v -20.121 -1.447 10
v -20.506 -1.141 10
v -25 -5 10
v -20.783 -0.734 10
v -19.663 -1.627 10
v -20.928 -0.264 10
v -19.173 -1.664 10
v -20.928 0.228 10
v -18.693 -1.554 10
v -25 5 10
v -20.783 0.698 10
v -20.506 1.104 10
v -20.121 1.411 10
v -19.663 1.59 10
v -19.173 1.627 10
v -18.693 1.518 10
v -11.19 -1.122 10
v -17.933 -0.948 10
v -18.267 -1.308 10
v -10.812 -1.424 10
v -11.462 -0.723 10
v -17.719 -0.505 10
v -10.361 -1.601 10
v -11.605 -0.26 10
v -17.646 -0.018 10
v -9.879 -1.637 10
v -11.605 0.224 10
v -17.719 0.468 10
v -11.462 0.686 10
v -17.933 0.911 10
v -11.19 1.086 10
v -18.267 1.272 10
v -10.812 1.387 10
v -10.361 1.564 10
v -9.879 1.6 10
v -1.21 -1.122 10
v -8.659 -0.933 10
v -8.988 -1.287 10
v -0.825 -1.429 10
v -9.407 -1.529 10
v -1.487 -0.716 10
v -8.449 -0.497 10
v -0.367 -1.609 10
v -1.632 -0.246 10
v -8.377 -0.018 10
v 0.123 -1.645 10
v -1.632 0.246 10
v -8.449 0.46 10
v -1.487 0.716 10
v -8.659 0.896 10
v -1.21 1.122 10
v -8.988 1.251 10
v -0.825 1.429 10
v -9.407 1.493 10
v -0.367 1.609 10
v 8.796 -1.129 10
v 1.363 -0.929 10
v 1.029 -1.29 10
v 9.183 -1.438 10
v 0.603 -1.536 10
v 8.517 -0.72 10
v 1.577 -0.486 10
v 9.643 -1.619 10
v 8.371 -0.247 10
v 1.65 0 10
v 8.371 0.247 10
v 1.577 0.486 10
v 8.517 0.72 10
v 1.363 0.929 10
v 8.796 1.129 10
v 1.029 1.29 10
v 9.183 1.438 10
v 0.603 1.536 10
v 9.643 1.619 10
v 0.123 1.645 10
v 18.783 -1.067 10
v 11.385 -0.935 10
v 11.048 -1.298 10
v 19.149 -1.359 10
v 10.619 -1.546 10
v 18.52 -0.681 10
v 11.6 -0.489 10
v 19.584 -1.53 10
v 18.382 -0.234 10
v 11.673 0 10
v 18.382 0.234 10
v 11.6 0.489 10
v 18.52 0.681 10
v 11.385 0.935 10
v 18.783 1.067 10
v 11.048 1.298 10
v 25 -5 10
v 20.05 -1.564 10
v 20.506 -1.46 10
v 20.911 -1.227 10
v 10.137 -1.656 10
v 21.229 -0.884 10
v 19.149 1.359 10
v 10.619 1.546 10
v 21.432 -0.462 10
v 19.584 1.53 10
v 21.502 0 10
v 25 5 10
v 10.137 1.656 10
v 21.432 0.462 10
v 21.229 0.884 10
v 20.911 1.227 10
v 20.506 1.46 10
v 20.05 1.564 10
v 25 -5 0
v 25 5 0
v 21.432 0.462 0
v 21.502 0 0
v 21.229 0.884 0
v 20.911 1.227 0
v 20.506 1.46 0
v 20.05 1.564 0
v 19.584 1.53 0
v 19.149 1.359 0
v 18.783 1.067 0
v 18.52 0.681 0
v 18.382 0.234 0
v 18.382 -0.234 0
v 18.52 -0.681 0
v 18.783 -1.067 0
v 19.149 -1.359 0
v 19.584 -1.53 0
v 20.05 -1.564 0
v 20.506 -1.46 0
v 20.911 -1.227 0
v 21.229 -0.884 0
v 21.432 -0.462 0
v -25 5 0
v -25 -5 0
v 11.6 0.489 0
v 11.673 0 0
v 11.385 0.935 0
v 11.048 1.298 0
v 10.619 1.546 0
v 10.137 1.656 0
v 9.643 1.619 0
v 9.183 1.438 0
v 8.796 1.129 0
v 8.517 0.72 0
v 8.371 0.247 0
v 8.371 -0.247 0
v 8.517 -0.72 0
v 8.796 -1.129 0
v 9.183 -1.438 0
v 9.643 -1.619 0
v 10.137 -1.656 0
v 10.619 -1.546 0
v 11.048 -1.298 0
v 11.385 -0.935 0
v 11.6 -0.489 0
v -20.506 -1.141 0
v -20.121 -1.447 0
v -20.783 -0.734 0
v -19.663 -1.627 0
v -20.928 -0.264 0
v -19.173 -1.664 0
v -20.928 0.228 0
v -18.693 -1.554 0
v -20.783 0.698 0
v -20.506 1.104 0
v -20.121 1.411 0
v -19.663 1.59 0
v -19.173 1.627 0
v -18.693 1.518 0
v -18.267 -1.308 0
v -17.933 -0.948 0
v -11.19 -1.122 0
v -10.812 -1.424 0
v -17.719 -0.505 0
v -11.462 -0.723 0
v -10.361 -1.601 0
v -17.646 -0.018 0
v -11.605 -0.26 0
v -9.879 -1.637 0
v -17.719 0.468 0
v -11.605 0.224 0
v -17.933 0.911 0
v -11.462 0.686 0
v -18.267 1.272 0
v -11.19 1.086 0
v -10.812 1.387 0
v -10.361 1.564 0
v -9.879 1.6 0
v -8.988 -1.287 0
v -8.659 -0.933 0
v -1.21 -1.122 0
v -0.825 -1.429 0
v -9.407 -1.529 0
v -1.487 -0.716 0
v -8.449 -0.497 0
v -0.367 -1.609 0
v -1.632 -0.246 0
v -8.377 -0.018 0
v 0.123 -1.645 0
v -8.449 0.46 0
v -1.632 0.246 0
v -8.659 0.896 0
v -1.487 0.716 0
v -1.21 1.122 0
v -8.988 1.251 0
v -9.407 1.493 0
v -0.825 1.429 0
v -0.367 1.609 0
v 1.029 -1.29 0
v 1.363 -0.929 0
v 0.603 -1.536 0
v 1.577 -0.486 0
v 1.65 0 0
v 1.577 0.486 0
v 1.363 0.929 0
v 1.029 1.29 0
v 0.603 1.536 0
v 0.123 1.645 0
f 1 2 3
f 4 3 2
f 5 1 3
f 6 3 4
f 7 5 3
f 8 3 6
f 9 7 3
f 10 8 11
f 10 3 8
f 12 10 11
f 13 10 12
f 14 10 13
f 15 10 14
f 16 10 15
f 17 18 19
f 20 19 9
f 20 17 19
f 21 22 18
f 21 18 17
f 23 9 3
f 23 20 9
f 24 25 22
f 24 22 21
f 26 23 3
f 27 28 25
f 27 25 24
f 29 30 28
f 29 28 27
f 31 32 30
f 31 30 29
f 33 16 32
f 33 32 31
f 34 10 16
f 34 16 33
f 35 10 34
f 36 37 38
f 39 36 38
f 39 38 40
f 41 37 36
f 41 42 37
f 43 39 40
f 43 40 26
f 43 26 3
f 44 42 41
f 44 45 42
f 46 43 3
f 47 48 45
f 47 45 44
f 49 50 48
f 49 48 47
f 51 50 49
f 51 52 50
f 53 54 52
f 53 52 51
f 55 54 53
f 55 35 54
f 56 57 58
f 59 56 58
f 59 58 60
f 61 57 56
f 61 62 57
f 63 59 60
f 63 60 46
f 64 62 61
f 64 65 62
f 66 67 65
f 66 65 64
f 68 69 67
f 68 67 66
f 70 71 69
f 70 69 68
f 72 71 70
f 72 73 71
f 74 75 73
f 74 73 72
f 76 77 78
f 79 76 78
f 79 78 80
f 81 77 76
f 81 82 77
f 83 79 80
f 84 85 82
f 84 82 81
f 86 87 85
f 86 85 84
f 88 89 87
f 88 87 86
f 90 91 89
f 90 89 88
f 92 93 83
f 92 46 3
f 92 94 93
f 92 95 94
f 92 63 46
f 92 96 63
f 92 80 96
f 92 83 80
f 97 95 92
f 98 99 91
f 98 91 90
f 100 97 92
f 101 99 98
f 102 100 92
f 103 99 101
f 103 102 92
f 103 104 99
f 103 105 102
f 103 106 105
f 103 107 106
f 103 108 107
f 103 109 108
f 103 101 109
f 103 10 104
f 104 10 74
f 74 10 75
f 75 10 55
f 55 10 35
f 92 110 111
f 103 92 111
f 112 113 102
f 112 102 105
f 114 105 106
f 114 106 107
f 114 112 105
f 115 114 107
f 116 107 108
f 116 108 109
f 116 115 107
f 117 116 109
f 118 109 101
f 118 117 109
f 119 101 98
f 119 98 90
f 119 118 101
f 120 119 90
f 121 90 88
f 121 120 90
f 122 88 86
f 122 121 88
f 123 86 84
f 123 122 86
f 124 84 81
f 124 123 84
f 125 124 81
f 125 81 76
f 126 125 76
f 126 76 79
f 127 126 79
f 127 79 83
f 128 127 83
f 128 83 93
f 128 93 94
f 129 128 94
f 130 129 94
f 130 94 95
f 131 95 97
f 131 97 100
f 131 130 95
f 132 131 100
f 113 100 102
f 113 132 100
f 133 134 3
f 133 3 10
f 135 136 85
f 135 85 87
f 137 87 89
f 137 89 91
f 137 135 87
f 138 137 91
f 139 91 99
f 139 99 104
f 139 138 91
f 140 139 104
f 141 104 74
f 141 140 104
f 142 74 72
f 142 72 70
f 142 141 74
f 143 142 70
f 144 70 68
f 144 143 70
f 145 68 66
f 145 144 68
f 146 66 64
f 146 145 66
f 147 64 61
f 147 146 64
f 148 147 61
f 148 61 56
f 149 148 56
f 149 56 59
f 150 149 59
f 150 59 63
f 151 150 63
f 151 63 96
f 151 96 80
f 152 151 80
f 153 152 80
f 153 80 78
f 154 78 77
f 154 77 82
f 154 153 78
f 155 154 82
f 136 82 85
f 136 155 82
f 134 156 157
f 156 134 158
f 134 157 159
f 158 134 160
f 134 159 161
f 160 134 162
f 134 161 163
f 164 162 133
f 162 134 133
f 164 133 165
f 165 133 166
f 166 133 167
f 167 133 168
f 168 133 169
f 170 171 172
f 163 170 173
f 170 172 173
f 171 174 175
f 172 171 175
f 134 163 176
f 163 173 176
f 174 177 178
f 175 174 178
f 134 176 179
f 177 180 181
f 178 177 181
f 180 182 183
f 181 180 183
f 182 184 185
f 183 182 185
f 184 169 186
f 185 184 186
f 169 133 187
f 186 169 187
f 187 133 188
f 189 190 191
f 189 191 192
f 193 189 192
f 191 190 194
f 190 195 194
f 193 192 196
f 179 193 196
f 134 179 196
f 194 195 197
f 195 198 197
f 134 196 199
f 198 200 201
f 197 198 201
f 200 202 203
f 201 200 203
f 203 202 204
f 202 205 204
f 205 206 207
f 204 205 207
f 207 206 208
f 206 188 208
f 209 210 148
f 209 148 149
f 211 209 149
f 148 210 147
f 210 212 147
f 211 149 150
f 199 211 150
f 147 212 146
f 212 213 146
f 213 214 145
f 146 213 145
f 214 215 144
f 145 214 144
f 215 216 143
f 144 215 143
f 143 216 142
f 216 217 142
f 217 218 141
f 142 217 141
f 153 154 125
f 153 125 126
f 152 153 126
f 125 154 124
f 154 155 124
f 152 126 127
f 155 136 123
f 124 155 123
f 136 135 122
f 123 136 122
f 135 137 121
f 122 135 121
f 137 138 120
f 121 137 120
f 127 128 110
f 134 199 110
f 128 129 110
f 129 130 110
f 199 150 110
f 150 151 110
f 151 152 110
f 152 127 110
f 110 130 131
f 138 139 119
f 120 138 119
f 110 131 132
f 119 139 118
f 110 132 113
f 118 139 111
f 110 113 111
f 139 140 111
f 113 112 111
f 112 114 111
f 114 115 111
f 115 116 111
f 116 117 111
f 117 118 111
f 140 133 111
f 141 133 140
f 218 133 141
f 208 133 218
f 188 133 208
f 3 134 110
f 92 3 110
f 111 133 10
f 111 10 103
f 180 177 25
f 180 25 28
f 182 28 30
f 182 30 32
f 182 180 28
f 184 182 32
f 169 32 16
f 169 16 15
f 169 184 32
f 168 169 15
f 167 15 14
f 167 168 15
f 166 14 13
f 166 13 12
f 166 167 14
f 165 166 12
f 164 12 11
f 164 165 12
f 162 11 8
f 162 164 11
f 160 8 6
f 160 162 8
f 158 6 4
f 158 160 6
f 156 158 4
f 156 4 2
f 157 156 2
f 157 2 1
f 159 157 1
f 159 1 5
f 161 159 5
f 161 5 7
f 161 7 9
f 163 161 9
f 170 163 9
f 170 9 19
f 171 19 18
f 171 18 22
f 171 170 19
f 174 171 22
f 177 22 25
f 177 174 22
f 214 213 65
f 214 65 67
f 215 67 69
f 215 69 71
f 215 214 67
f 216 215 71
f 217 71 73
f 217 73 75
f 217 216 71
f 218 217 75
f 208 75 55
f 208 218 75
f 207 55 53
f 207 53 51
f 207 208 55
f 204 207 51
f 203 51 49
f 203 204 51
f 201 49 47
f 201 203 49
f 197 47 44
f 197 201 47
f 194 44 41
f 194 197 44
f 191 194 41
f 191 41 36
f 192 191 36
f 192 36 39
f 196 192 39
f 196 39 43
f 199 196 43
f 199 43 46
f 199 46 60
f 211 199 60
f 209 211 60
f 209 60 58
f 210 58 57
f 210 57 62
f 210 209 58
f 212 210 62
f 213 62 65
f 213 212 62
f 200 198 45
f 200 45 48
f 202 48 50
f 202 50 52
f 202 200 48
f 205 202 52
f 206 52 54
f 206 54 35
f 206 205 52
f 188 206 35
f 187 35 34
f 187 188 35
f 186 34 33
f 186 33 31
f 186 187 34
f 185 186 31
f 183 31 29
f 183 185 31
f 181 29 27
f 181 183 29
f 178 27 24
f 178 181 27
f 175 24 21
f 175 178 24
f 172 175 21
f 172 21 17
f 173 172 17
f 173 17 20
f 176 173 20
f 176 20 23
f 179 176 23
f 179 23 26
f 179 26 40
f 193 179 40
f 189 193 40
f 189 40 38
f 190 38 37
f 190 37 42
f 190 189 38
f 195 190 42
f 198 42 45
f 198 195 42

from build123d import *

# Parameters (mm, degrees)
SKETCH_W      = 50
SKETCH_H      = 10
SKETCH_R      = 1.65
SKETCH_R_2    = 1.623146
SKETCH_R_3    = 1.660457
SKETCH_R_4    = 1.568869
EXTRUDE_DEPTH = 10


with BuildPart() as part:
    # Sketch → Extrude (new body)
    with BuildSketch(Plane.XY):
        Rectangle(SKETCH_W, SKETCH_H)
        Circle(SKETCH_R, mode=Mode.SUBTRACT)
        with Locations((-10, -0.018389)):
            Circle(SKETCH_R_2, mode=Mode.SUBTRACT)
        with Locations((-19.296049, -0.018389)):
            Circle(SKETCH_R, mode=Mode.SUBTRACT)
        with Locations((10.012862, 0)):
            Circle(SKETCH_R_3, mode=Mode.SUBTRACT)
        with Locations((19.933031, 0)):
            Circle(SKETCH_R_4, mode=Mode.SUBTRACT)
    extrude(amount=EXTRUDE_DEPTH)


solid = part.part
